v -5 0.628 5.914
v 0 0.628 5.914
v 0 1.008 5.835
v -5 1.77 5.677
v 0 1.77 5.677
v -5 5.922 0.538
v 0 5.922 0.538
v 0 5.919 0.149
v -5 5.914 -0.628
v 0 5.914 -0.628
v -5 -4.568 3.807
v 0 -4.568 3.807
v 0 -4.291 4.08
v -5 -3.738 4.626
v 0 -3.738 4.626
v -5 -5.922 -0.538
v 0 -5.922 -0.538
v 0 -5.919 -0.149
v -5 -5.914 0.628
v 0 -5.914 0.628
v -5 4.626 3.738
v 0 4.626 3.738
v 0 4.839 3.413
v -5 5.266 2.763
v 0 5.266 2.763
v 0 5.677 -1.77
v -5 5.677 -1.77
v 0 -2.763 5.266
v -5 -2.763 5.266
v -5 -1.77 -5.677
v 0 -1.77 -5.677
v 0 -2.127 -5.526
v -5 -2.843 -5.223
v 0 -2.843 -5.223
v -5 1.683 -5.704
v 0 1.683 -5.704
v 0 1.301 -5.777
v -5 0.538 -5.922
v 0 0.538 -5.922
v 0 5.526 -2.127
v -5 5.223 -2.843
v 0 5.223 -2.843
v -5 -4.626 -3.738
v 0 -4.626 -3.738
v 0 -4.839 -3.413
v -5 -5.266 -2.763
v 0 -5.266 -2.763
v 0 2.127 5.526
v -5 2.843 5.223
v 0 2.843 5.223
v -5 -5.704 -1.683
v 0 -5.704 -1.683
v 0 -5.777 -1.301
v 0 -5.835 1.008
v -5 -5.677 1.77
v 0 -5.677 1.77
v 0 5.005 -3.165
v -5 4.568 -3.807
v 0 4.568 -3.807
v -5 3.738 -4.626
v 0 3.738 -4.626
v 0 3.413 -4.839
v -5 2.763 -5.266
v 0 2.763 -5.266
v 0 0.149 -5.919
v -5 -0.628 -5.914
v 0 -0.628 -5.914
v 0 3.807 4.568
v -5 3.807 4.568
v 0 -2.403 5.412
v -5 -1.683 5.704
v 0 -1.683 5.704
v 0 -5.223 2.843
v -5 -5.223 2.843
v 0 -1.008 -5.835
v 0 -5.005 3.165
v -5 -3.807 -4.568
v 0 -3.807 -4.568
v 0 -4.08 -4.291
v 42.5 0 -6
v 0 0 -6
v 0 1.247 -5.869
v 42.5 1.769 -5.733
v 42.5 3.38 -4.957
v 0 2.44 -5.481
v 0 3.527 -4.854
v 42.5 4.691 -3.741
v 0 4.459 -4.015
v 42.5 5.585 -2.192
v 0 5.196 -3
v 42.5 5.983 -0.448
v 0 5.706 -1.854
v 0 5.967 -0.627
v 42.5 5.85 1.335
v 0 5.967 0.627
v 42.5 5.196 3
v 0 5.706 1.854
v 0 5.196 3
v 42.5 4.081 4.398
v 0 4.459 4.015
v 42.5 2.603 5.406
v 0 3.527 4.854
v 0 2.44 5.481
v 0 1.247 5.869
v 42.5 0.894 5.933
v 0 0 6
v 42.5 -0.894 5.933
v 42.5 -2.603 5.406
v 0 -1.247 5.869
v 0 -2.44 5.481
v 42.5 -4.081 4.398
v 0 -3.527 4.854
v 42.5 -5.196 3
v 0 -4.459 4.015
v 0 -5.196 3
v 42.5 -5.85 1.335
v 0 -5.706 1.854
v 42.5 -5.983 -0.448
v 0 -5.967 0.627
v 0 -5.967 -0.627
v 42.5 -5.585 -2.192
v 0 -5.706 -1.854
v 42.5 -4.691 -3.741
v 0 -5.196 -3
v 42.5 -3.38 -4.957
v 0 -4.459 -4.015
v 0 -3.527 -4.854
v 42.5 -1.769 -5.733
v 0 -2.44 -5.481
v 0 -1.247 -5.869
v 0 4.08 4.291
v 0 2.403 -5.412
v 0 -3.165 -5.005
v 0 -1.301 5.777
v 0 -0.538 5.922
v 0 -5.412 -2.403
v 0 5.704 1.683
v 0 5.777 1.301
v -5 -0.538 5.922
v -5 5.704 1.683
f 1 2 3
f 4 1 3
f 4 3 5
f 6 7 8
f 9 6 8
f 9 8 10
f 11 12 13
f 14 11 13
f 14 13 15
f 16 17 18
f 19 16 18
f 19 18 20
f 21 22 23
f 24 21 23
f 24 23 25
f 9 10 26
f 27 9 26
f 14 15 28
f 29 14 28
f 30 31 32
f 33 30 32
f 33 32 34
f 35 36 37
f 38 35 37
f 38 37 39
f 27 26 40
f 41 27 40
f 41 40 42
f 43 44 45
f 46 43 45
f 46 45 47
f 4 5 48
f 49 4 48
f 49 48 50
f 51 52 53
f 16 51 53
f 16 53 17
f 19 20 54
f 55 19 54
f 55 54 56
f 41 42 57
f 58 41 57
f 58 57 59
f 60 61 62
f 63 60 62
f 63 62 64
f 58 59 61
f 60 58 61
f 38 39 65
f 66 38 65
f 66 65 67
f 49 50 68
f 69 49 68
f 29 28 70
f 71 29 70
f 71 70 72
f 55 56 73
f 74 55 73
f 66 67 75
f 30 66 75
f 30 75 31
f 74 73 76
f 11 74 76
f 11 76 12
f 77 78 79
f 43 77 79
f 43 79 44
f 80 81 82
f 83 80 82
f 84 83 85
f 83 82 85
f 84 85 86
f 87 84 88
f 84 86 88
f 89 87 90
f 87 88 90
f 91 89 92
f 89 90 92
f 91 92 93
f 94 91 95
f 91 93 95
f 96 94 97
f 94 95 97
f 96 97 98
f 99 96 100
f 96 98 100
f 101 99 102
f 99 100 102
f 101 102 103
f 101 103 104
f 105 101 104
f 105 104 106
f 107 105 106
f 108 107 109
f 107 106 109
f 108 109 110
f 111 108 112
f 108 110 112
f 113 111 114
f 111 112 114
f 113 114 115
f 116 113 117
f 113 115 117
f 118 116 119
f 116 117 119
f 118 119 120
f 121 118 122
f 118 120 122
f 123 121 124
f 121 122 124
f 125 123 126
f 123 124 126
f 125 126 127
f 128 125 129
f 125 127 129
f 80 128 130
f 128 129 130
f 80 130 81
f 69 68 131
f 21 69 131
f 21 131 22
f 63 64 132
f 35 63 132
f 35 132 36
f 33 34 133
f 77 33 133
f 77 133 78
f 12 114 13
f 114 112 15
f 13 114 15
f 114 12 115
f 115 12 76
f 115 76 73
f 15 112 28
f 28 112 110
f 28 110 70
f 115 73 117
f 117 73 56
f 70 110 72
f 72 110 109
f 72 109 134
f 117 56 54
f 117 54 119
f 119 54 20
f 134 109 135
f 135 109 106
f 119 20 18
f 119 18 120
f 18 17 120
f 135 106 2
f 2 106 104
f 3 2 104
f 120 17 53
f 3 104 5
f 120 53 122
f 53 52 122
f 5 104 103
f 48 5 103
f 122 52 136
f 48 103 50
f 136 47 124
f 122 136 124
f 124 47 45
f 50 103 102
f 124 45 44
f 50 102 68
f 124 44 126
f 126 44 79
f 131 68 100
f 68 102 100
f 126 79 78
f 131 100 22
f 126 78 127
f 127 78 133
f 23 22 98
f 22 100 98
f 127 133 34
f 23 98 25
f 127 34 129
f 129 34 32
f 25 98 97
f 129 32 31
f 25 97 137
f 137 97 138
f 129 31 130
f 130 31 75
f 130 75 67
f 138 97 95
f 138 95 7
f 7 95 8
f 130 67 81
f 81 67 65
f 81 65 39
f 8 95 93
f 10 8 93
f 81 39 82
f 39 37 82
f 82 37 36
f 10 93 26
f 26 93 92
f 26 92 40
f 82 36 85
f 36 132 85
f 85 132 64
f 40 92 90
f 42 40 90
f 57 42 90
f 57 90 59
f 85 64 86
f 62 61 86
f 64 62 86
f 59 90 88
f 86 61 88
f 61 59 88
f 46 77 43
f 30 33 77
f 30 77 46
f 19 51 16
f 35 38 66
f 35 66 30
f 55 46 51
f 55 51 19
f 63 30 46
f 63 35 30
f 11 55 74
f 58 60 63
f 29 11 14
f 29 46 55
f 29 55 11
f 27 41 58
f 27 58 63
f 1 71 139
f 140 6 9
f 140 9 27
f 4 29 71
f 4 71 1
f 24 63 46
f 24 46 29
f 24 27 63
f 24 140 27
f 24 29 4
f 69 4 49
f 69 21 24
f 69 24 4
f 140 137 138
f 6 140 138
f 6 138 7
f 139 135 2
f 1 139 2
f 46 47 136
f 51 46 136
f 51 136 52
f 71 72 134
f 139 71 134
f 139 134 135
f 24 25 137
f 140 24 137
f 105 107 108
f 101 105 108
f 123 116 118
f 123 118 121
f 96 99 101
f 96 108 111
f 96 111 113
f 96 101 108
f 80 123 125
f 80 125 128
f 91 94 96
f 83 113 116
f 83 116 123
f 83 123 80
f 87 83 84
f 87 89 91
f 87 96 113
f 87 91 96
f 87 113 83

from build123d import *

# Parameters (mm, degrees)
SKETCH_1_R      = 6
EXTRUDE_1_DEPTH = 42.5
EXTRUDE_2_DEPTH = 5


with BuildPart() as part:
    # 草图1 → 凸台-拉伸1 (new body)
    with BuildSketch(Plane(origin=(0, 0, 0), x_dir=(0, 0, -1), z_dir=(1, 0, 0))):
        Circle(SKETCH_1_R)
    extrude(amount=EXTRUDE_1_DEPTH)

    # 草图2 → 凸台-拉伸2 (add)
    with BuildSketch(Plane.ZY):
        Polygon((-5.922430933, 0.537848847), (-5.913562188, -0.627894725), (-5.677438564, -1.769508656), (-5.223134161, -2.843121361), (-4.568107641, -3.807474506), (-3.737531306, -4.625508542), (-2.763323739, -5.265786878), (-1.68292319, -5.703703978), (-0.537848847, -5.922430933), (0.627894725, -5.913562188), (1.769508656, -5.677438564), (2.843121361, -5.223134161), (3.807474506, -4.568107641), (4.625508542, -3.737531306), (5.265786878, -2.763323739), (5.703703978, -1.68292319), (5.922430933, -0.537848847), (5.913562188, 0.627894725), (5.677438564, 1.769508656), (5.223134161, 2.843121361), (4.568107641, 3.807474506), (3.737531306, 4.625508542), (2.763323739, 5.265786878), (1.68292319, 5.703703978), (0.537848847, 5.922430933), (-0.627894725, 5.913562188), (-1.769508656, 5.677438564), (-2.843121361, 5.223134161), (-3.807474506, 4.568107641), (-4.625508542, 3.737531306), (-5.265786878, 2.763323739), (-5.703703978, 1.68292319), align=None)
    extrude(amount=EXTRUDE_2_DEPTH)


solid = part.part
